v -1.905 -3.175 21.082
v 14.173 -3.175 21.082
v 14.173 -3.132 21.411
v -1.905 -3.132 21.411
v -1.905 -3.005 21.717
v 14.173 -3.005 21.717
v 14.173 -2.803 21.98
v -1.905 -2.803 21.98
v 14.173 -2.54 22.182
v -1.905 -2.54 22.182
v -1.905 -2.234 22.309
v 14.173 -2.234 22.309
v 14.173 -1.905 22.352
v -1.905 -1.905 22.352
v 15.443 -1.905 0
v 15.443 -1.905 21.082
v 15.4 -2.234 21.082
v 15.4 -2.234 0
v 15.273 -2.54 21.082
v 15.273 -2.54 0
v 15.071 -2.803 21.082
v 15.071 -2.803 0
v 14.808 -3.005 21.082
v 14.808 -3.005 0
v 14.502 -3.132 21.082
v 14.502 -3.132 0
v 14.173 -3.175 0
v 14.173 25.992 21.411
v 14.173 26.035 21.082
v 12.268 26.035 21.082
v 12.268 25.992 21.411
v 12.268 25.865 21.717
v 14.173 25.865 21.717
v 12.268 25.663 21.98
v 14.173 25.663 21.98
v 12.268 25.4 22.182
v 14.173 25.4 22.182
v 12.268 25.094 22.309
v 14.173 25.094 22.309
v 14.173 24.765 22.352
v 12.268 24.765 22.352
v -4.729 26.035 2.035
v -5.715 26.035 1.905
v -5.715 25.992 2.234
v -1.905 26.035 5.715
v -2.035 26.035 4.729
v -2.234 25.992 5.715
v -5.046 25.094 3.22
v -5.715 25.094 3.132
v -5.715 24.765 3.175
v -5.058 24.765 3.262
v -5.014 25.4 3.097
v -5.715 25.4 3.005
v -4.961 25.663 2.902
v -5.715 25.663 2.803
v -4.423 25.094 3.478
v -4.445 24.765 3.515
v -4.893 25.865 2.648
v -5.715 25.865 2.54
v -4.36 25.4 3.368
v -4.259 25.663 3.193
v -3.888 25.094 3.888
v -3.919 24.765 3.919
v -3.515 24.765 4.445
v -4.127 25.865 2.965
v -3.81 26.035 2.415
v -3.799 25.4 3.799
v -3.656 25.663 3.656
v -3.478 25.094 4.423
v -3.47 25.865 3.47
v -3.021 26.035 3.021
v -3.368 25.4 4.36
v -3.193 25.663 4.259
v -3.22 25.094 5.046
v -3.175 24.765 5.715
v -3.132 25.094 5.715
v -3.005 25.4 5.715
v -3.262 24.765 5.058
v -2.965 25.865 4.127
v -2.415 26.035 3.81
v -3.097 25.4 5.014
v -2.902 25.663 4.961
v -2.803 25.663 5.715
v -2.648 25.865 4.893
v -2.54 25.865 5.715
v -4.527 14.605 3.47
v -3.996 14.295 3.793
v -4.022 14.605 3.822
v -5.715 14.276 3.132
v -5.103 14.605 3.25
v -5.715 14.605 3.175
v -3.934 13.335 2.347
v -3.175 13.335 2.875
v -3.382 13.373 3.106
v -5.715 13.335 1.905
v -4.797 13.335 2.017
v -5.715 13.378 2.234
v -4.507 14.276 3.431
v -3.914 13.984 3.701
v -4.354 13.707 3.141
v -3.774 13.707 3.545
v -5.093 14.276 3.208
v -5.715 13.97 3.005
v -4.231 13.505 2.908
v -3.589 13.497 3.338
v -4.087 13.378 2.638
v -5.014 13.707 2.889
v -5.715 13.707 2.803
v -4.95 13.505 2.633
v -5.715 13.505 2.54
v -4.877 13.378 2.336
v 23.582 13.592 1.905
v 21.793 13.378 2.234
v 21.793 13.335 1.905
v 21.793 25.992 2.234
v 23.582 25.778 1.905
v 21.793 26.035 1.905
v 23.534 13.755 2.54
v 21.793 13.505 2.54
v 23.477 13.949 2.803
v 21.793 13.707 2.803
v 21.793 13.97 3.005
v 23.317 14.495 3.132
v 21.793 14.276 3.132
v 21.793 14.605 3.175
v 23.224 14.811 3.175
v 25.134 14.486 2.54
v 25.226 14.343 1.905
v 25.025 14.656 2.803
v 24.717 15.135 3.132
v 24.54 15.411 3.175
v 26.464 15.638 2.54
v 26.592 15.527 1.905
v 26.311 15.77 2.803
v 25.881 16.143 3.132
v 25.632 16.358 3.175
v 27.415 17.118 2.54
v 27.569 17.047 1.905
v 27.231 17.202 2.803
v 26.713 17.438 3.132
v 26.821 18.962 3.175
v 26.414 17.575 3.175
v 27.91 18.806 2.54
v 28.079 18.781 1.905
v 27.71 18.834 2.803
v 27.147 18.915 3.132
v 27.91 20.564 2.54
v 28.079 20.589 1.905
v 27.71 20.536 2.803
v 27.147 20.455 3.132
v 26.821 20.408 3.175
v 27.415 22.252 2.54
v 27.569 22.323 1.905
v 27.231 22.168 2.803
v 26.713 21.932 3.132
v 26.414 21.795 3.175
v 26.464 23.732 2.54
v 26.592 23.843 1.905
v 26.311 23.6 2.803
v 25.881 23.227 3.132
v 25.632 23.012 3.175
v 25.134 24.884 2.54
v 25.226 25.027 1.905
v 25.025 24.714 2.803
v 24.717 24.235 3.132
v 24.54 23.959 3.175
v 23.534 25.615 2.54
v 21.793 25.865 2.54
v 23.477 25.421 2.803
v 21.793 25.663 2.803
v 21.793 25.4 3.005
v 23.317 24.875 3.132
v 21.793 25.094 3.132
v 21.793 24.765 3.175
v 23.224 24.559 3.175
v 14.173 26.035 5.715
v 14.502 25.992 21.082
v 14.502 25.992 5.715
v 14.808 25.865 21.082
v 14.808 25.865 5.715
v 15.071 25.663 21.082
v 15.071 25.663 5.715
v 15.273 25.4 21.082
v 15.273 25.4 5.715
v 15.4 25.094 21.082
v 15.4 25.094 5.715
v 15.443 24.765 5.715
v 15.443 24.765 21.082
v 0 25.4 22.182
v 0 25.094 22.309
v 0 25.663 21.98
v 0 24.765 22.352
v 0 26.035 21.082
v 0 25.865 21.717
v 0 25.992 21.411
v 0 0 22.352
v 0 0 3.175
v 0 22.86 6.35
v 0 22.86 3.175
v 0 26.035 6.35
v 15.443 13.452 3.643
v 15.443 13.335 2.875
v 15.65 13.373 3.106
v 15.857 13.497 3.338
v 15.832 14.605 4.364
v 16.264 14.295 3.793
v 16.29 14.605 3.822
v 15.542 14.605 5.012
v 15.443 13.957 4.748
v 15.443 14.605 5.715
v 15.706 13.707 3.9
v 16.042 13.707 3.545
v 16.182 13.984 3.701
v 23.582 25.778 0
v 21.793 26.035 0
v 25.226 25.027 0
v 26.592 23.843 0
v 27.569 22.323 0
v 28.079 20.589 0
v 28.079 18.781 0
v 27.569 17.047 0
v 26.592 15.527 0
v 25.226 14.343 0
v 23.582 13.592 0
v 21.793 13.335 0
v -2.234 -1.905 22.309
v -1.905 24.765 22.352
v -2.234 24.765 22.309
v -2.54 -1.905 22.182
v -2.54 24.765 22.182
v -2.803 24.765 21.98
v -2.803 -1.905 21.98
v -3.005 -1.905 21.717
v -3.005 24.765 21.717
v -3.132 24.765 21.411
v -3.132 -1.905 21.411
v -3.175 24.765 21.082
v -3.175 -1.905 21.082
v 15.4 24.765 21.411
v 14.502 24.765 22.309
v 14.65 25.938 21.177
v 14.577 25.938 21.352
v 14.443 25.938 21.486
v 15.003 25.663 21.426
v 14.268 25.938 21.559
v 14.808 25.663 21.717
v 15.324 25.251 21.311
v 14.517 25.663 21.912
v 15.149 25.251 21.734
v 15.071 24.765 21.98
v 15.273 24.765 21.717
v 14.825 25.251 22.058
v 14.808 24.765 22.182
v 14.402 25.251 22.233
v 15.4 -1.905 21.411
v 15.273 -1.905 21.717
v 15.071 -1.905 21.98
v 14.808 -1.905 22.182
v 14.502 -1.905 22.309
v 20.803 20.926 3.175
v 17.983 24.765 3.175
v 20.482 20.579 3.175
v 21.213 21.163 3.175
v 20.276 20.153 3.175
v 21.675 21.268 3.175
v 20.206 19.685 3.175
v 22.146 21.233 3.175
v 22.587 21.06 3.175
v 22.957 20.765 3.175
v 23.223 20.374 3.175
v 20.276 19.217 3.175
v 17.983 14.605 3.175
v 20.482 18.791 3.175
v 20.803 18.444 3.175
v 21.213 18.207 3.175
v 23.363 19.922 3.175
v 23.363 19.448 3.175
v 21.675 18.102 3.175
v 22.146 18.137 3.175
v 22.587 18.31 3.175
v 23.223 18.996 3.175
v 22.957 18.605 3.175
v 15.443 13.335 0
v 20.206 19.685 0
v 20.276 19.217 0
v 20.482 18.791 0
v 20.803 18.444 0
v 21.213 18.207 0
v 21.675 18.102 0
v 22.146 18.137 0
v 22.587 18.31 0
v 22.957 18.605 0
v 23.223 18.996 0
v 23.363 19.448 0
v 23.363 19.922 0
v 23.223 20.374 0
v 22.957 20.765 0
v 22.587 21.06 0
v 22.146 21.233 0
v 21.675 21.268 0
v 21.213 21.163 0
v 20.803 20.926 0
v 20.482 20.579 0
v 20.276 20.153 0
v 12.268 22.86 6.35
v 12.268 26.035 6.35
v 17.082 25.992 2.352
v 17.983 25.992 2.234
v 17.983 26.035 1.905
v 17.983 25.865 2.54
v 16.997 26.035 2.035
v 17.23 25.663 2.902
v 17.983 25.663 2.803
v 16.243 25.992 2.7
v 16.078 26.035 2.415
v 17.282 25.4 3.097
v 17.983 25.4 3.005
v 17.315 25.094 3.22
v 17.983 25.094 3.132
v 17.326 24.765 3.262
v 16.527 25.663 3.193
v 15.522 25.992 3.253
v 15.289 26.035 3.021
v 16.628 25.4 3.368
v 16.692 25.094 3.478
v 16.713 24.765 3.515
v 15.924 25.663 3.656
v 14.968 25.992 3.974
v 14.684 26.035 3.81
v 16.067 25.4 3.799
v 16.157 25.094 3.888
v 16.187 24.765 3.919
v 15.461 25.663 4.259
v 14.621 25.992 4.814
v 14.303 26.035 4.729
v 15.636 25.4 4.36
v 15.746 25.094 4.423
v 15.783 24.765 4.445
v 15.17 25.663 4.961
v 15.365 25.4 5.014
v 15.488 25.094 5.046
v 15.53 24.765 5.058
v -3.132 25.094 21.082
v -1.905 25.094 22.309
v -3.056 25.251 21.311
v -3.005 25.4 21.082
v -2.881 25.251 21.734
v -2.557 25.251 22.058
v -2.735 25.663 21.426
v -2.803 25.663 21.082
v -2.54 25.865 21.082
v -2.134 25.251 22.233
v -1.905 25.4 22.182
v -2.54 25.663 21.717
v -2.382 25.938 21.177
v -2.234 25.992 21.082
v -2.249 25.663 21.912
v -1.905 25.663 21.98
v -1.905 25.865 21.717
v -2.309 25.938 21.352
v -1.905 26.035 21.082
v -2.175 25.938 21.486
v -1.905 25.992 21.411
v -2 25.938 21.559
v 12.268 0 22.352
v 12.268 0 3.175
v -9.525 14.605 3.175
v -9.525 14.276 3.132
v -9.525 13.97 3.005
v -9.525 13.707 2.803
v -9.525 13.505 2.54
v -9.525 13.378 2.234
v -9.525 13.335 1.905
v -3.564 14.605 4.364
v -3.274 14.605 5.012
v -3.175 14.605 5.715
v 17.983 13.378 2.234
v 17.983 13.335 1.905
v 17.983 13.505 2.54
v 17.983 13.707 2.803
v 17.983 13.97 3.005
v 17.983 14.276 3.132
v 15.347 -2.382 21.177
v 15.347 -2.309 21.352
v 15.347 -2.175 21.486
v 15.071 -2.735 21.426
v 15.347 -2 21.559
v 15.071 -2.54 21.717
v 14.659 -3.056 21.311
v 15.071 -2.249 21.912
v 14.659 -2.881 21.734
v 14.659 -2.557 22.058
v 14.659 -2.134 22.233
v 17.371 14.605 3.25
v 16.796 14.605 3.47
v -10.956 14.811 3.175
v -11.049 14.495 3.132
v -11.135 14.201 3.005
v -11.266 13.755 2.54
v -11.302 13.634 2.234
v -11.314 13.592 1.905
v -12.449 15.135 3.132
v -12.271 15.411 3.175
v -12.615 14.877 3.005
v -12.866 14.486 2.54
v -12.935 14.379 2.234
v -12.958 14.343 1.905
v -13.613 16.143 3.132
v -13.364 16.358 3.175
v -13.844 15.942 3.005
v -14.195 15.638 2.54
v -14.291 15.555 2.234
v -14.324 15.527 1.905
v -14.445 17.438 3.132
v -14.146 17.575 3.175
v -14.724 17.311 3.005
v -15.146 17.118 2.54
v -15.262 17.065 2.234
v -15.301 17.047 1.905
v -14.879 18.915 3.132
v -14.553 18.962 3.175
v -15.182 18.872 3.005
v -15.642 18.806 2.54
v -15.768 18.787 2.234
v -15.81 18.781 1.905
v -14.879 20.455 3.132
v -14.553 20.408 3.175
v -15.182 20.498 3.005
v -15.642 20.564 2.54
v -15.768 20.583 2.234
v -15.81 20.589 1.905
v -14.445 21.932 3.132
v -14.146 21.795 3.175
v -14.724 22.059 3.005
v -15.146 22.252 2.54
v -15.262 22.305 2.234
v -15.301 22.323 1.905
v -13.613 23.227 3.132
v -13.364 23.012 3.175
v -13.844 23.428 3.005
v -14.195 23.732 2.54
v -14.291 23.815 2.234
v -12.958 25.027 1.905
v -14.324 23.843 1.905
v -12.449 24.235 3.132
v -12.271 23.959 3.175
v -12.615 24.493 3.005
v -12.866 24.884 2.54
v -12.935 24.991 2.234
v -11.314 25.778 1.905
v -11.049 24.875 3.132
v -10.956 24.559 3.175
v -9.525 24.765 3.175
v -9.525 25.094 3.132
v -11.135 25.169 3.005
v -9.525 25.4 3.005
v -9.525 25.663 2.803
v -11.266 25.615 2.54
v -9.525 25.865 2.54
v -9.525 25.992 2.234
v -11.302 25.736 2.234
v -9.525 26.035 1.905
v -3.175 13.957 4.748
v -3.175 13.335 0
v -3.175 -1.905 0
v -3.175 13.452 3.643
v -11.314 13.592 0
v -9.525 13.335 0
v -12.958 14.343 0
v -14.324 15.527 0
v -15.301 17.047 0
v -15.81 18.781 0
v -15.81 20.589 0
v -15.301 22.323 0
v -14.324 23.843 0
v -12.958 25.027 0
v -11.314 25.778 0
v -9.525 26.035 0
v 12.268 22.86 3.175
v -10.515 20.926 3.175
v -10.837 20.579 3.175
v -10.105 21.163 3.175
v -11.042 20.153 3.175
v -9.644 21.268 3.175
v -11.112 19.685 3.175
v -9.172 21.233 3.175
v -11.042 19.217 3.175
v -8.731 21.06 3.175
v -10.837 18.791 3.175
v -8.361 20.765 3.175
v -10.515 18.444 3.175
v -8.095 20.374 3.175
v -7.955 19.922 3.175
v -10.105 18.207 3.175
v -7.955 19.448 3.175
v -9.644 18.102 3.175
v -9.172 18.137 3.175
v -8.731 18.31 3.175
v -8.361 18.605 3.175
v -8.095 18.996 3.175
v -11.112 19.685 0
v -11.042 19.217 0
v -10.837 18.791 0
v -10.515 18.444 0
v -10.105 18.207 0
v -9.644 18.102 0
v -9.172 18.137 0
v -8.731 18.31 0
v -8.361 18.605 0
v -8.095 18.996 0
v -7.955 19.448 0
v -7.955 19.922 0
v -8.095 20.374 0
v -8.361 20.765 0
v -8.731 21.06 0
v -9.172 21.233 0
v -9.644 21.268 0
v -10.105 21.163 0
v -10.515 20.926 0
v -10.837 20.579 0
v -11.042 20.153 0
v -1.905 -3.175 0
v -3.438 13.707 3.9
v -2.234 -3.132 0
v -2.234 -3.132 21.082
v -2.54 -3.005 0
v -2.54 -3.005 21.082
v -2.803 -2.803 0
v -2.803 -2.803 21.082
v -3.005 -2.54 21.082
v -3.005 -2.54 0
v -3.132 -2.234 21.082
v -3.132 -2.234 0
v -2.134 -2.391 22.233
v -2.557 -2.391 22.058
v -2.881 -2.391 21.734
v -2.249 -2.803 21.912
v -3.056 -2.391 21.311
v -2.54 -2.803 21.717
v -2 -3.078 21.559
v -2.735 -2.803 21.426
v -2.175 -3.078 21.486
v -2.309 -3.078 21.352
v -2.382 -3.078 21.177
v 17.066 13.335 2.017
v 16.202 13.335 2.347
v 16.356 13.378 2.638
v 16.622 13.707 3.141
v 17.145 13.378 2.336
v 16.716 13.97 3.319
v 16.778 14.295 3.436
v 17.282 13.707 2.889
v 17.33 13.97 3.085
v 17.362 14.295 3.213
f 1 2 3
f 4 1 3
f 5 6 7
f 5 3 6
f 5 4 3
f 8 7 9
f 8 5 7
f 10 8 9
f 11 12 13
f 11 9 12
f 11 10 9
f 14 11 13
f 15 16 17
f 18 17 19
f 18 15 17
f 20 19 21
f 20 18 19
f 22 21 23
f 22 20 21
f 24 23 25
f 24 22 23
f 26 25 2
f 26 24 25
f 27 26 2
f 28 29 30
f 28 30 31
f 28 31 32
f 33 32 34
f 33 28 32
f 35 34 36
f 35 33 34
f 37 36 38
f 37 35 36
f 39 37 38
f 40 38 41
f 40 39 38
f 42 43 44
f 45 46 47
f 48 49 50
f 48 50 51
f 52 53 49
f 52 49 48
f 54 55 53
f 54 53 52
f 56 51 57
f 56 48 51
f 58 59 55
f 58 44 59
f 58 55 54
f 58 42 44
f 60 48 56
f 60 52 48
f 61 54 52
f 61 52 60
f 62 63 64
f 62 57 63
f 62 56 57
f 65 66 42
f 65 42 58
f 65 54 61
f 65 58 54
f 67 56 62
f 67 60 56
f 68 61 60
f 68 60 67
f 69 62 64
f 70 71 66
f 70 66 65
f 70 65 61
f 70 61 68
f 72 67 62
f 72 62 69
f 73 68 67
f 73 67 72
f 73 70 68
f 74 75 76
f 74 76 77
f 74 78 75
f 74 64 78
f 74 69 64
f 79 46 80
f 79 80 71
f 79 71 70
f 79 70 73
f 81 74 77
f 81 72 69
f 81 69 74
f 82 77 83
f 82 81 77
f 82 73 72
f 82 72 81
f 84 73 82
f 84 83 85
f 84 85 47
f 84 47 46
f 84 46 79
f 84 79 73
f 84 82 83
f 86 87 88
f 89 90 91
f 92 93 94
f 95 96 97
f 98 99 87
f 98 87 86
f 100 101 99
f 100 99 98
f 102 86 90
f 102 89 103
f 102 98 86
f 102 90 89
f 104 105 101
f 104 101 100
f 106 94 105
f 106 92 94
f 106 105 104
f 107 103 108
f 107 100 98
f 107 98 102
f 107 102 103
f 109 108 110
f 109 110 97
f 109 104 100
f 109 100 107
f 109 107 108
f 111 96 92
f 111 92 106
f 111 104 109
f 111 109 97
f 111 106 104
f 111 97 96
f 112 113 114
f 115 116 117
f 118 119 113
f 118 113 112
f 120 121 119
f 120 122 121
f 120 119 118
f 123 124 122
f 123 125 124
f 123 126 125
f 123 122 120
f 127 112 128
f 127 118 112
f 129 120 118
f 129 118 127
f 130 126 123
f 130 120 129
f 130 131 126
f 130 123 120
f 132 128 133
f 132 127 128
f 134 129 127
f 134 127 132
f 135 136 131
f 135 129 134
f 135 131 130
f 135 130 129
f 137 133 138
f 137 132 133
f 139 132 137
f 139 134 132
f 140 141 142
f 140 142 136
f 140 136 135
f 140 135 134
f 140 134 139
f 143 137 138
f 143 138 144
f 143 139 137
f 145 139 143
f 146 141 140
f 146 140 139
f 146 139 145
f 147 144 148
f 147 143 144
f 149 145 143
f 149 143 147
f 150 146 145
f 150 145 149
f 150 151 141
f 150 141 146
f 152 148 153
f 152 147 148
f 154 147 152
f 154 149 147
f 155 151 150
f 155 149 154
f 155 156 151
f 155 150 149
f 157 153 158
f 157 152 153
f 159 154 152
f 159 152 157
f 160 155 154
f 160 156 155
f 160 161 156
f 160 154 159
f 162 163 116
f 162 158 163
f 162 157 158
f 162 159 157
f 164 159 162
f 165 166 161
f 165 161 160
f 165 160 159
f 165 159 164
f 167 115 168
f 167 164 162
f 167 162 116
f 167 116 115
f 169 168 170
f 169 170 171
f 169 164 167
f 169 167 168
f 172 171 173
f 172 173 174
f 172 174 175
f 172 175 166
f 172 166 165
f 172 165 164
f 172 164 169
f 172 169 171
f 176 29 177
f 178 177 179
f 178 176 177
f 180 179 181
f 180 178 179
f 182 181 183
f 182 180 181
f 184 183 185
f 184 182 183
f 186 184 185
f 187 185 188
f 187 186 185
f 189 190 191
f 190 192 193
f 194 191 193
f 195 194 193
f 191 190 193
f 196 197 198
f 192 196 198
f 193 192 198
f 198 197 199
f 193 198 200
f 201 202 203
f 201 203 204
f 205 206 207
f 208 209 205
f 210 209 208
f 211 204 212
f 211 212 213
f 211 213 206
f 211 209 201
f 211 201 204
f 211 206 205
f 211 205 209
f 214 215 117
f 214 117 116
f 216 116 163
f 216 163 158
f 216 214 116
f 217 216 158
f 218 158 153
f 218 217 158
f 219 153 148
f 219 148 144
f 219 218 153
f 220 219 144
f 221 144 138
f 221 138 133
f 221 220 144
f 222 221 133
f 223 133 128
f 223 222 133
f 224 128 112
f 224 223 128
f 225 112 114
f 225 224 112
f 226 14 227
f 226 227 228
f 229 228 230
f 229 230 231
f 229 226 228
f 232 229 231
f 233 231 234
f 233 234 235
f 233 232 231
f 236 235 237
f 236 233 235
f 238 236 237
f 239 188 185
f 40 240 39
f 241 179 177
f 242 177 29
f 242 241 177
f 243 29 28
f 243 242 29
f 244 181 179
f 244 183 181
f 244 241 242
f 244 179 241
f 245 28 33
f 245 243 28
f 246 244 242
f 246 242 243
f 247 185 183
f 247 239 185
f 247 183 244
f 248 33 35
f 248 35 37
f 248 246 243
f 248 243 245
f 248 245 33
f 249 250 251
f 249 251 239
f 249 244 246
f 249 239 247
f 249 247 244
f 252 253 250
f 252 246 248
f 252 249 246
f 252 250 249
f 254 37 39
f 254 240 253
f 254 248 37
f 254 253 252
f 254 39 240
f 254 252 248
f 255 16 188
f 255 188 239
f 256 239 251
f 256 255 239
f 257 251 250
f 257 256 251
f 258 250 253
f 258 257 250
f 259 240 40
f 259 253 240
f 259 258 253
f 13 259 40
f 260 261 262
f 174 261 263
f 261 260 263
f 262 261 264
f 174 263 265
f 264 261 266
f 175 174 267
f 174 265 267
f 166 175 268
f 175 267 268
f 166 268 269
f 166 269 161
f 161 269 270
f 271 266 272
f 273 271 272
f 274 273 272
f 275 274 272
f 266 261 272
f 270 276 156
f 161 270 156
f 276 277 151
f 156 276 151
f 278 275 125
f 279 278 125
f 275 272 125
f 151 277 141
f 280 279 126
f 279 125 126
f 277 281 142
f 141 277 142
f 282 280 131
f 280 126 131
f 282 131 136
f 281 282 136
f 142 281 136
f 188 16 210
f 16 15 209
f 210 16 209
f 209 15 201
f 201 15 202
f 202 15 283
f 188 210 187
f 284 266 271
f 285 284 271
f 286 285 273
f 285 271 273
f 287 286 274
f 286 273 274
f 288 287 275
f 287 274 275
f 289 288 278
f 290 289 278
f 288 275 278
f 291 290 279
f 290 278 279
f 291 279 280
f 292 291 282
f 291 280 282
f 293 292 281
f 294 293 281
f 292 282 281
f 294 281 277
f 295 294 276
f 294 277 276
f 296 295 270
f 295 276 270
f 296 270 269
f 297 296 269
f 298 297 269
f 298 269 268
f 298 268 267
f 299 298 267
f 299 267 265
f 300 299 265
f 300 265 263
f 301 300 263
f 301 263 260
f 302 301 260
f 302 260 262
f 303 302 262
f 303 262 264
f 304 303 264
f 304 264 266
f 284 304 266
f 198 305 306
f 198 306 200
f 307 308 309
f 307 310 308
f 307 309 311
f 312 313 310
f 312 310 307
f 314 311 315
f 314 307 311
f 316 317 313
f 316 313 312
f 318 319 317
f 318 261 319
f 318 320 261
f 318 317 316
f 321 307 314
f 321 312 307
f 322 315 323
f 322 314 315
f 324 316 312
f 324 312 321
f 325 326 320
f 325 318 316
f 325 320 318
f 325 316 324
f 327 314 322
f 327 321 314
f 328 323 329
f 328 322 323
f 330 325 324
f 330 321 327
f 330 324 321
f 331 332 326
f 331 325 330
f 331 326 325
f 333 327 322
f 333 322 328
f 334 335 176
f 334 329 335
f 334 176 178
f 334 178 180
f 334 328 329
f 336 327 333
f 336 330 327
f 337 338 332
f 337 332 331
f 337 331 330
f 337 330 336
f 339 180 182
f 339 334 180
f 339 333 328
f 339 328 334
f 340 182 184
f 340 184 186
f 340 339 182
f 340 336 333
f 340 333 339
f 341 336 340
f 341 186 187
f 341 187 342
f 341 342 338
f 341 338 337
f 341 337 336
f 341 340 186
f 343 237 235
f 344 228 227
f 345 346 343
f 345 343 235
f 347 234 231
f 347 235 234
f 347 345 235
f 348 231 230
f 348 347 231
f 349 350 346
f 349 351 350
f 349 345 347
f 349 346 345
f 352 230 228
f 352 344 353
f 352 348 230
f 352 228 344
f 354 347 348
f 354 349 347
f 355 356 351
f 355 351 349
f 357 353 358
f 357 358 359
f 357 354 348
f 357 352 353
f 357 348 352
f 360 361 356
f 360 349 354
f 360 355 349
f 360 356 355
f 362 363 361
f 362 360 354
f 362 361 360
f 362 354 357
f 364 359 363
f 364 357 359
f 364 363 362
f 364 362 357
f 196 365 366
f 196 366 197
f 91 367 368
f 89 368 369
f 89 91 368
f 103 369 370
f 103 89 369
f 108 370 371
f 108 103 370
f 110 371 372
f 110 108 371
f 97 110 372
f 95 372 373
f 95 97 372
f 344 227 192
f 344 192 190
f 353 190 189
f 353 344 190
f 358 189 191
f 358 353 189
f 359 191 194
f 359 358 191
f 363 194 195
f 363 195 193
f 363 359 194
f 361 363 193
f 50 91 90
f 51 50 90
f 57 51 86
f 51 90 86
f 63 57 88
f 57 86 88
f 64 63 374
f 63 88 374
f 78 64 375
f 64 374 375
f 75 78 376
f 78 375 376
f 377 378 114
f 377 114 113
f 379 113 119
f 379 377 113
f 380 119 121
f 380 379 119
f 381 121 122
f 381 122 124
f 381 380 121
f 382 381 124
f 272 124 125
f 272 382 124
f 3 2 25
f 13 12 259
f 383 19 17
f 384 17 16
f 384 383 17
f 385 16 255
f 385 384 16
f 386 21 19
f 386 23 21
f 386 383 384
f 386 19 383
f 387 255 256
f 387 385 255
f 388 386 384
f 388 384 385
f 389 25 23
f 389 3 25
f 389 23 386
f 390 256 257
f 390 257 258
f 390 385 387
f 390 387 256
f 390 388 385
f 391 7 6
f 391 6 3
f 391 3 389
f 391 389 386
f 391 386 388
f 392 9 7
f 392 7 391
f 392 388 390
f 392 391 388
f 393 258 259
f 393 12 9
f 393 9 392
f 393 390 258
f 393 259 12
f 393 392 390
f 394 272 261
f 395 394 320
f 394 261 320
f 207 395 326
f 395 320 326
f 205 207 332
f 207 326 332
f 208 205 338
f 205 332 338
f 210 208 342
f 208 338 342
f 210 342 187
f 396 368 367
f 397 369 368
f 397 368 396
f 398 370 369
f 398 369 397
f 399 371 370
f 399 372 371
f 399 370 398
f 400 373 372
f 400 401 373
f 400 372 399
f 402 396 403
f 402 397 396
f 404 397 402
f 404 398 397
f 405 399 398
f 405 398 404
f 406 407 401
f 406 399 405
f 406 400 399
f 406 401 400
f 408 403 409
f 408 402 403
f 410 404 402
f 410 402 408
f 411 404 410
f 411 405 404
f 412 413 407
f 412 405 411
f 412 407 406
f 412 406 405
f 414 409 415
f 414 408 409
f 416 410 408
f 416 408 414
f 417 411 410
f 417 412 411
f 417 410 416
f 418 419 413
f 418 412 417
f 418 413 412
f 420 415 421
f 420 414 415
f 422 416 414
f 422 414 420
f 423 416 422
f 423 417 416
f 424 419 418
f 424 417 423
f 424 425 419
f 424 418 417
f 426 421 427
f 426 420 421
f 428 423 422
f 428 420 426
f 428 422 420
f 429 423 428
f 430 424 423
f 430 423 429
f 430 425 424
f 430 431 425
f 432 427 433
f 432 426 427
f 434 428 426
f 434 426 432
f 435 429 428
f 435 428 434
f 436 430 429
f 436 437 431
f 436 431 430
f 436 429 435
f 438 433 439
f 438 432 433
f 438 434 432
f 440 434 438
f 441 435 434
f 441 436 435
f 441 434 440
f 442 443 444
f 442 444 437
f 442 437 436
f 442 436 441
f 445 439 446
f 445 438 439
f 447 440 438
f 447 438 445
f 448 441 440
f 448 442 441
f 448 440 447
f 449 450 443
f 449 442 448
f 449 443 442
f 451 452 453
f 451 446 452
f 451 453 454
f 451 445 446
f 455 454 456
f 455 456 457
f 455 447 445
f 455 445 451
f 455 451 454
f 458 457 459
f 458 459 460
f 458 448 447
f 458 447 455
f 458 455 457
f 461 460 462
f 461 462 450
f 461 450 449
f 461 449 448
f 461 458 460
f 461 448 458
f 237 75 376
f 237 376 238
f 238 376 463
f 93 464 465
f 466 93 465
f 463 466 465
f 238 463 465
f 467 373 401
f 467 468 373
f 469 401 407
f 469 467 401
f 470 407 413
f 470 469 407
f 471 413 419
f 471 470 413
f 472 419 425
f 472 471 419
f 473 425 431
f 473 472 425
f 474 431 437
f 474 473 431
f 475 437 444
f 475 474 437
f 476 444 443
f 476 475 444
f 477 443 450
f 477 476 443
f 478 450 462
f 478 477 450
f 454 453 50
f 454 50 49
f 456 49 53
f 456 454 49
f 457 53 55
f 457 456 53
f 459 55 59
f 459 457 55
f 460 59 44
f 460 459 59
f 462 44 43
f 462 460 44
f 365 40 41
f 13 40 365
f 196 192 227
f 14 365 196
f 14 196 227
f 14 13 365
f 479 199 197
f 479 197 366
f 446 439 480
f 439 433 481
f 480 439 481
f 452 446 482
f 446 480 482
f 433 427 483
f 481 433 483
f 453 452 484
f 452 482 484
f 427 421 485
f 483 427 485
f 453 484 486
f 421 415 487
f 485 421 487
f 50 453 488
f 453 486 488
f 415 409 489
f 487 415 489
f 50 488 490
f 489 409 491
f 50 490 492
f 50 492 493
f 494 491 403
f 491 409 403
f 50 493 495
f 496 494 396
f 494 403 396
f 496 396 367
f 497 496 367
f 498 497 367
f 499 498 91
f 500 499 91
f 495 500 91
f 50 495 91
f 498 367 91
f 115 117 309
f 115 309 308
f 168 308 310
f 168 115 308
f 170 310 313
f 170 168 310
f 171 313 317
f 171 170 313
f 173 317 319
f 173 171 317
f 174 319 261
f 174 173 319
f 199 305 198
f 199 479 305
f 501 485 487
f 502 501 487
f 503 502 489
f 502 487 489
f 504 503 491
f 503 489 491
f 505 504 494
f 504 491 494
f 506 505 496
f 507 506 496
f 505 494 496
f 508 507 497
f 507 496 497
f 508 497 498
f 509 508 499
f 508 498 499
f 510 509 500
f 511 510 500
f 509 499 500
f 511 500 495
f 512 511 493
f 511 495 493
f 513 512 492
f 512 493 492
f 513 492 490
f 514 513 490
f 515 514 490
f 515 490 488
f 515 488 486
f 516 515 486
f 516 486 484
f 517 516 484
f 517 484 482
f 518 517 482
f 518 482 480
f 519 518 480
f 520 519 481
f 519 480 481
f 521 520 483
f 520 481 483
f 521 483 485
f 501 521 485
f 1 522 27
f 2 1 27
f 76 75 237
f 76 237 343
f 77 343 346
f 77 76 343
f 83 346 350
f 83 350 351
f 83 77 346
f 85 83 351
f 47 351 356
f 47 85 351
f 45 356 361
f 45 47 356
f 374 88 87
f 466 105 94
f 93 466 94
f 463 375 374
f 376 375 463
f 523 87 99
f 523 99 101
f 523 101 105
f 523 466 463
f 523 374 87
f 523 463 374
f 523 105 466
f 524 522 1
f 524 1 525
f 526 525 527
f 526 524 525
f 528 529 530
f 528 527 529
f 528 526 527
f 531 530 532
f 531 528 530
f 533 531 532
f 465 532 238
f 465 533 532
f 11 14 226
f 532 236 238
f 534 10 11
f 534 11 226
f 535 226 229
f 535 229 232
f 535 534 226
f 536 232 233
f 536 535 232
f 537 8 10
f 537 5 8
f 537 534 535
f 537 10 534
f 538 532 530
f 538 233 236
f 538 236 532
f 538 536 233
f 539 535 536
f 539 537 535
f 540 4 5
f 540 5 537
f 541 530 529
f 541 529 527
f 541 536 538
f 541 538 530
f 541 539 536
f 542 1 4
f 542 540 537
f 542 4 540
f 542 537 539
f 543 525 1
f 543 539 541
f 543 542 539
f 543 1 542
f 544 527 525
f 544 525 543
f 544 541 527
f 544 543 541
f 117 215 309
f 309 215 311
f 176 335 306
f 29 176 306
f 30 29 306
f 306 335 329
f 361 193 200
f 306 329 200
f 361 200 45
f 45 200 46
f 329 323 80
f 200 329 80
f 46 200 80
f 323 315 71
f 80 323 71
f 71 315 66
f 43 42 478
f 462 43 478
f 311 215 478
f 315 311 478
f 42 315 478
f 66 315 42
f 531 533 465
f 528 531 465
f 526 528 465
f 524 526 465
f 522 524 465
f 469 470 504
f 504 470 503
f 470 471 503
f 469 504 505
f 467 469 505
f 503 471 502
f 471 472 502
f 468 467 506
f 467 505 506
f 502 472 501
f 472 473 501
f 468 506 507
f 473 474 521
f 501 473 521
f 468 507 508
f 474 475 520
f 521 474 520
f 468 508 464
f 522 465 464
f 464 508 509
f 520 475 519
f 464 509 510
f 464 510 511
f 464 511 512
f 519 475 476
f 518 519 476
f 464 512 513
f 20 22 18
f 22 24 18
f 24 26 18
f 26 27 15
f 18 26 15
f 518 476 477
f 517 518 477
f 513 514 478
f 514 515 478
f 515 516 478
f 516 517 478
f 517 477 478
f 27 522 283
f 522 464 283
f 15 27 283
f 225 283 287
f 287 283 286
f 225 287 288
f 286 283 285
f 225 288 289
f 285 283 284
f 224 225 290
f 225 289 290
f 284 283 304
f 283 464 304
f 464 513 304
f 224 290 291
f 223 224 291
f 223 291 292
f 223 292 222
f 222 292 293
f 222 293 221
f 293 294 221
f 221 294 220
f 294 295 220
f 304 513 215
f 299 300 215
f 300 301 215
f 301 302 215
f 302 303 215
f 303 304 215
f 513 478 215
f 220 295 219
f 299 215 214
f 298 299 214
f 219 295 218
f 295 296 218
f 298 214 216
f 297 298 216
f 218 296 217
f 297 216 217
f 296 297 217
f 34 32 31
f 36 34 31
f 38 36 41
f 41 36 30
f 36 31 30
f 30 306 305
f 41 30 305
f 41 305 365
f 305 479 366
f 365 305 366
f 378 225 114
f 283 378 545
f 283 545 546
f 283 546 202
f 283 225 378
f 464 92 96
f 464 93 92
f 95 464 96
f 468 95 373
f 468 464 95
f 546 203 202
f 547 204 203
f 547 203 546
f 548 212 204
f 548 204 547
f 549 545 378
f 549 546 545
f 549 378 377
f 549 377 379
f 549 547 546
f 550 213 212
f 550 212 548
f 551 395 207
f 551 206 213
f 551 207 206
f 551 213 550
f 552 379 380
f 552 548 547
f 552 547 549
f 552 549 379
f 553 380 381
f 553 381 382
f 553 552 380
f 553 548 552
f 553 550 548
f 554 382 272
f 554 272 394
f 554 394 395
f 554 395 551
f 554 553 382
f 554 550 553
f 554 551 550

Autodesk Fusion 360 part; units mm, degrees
sketch "Sketch1" plane through (0, 0, 0) normal (0, 0, 1) x (1, 0, 0)
  line L0 (0, 0) -> (12.2682, 0)
  line L1 (12.2682, 0) -> (12.2682, 22.86)
  line L2 (12.2682, 22.86) -> (0, 22.86)
  line L3 (0, 22.86) -> (0, 0)
  line L4 (-3.175, -3.175) -> (15.4432, -3.175)
  line L5 (15.4432, -3.175) -> (15.4432, 26.035)
  line L6 (15.4432, 26.035) -> (-3.175, 26.035)
  line L7 (-3.175, 26.035) -> (-3.175, -3.175)
  line L8 (0, 22.86) -> (0, 26.035)
  line L9 (12.2682, 22.86) -> (12.2682, 26.035)
  dimension "d1" = 12.2682
  dimension "d2" = 22.86
  dimension "d3" = 3.175
extrude "Extrude1" add sketch "Sketch1" along normal blind 3.175
sketch "Sketch2" plane through (0, 0, 3.175) normal (0, 0, 1) x (-1, 0, 0)
  line L0 (3.175, -26.035) -> (3.175, 3.175)
  line L1 (3.175, 3.175) -> (-15.4432, 3.175)
  line L2 (-15.4432, 3.175) -> (-15.4432, -26.035)
  line L3 (-15.4432, -26.035) -> (3.175, -26.035)
  line L4 (-12.2682, 0) -> (-12.2682, -22.86)
  line L5 (-12.2682, -22.86) -> (0, -22.86)
  line L6 (0, -22.86) -> (0, 0)
  line L7 (0, 0) -> (-12.2682, 0)
  dimension "d6" = -3.175
extrude "Extrude2" add sketch "Sketch2" along normal blind 3.175
sketch "Sketch3" plane through (0, 0, 6.35) normal (0, 0, 1) x (-1, 0, 0)
  line L0 (-12.2682, 0) -> (0, 0)
  line L1 (0, 0) -> (0, -22.86)
  line L2 (0, -22.86) -> (-12.2682, -22.86)
  line L3 (-12.2682, -22.86) -> (-12.2682, 0)
  line L4 (-15.4432, -26.035) -> (3.175, -26.035)
  line L5 (3.175, -26.035) -> (3.175, 3.175)
  line L6 (3.175, 3.175) -> (-15.4432, 3.175)
  line L7 (-15.4432, 3.175) -> (-15.4432, -26.035)
  line L8 (0, -22.86) -> (0, -26.035)
  line L9 (-12.2682, -22.86) -> (-12.2682, -26.035)
extrude "Extrude3" add sketch "Sketch3" along normal blind 16.002 contours L0 L1 L3 L4 L5 L6 L7 L8 L9
sketch "Sketch4" plane through (0, 0, 0) normal (0, 0, -1) x (1, 0, 0)
  line L0 (-3.175, 3.175) -> (-3.175, -26.035)
  line L1 (-3.175, -26.035) -> (15.4432, -26.035)
  line L2 (15.4432, -26.035) -> (15.4432, 3.175)
  line L3 (15.4432, 3.175) -> (-3.175, 3.175)
  line L4 (15.4432, -26.035) -> (21.7932, -26.035)
  line L5 (21.7932, -26.035) -> (21.7932, -19.685)
  line L6 (21.7932, -19.685) -> (15.4432, -19.685)
  line L7 (15.4432, -19.685) -> (15.4432, -26.035)
  line L8 (-3.175, -26.035) -> (-9.525, -26.035)
  line L9 (-9.525, -26.035) -> (-9.525, -19.685)
  line L10 (-9.525, -19.685) -> (-3.175, -19.685)
  line L11 (-3.175, -19.685) -> (-3.175, -26.035)
  circle A0 centre (21.7932, -19.685) radius 6.35
  circle A1 centre (-9.525, -19.685) radius 6.35
  line L12 (-9.525, -19.685) -> (21.7932, -19.685)
  line L13 (21.7932, -19.685) -> (21.7932, -13.335)
  line L14 (21.7932, -13.335) -> (-9.525, -13.335)
  line L15 (-9.525, -13.335) -> (-9.525, -19.685)
  dimension "d11" = 6.35
  dimension "d12" = 6.35
  dimension "d13" = 6.35
  dimension "d14" = 6.35
extrude "Extrude4" add sketch "Sketch4" against normal blind 3.175 contours L0 A1 L14 | L9 L10 A1 L12 | L10 A1 L12 L15 | L0 L8 L11 A1 | L9 A1 L15 | L2 L4 L7 A0 | L6 A0 L12 L13 | L2 A0 L14 | L5 L6 A0 L12 | L5 A0 L13
sketch "Sketch5" plane through (0, 0, 3.175) normal (0, 0, 1) x (-1, 0, 0)
  line L0 (-15.4432, -26.035) -> (-15.4432, -13.335)
  line L1 (-15.4432, -13.335) -> (-21.7932, -13.335)
  arc A0 (-21.7932, -13.335) -> (-21.7932, -26.035) centre (-21.7932, -19.685) ccw
  line L2 (-21.7932, -26.035) -> (-15.4432, -26.035)
  circle A1 centre (-21.7932, -19.685) radius 1.5875
  dimension "d17" = 3.175
extrude "Extrude5" cut sketch "Sketch5" against normal blind 127 contours A1
sketch "Sketch6" plane through (0, 0, 3.175) normal (0, 0, 1) x (-1, 0, 0)
  arc A0 (9.525, -26.035) -> (9.525, -13.335) centre (9.525, -19.685) ccw
  line L0 (9.525, -13.335) -> (3.175, -13.335)
  line L1 (3.175, -13.335) -> (3.175, -26.035)
  line L2 (3.175, -26.035) -> (9.525, -26.035)
  circle A1 centre (9.525, -19.685) radius 1.5875
  dimension "d20" = 3.175
extrude "Extrude6" cut sketch "Sketch6" against normal blind 25.4 contours A1
fillet "Fillet1" radius 2.54 1 edges at (15.4432, 19.685, 3.175)
fillet "Fillet2" radius 2.54 1 edges at (-3.175, 19.685, 3.175)
fillet "Fillet3" radius 1.27 17 edges at (-3.175, 11.43, 22.352) (-3.9189, 13.335, 3.9189) (-7.62, 13.335, 3.175) (-15.875, 19.685, 3.175) (-7.62, 26.035, 3.175) (-3.9189, 26.035, 3.9189) (-3.175, 26.035, 14.0335) (-3.175, -3.175, 11.176) (15.4432, -3.175, 11.176) (6.1341, -3.175, 22.352) (15.4432, 11.43, 22.352) (16.1871, 13.335, 3.9189) (19.8882, 13.335, 3.175) (28.1432, 19.685, 3.175) (19.8882, 26.035, 3.175) (16.1871, 26.035, 3.9189) (15.4432, 26.035, 14.0335)
